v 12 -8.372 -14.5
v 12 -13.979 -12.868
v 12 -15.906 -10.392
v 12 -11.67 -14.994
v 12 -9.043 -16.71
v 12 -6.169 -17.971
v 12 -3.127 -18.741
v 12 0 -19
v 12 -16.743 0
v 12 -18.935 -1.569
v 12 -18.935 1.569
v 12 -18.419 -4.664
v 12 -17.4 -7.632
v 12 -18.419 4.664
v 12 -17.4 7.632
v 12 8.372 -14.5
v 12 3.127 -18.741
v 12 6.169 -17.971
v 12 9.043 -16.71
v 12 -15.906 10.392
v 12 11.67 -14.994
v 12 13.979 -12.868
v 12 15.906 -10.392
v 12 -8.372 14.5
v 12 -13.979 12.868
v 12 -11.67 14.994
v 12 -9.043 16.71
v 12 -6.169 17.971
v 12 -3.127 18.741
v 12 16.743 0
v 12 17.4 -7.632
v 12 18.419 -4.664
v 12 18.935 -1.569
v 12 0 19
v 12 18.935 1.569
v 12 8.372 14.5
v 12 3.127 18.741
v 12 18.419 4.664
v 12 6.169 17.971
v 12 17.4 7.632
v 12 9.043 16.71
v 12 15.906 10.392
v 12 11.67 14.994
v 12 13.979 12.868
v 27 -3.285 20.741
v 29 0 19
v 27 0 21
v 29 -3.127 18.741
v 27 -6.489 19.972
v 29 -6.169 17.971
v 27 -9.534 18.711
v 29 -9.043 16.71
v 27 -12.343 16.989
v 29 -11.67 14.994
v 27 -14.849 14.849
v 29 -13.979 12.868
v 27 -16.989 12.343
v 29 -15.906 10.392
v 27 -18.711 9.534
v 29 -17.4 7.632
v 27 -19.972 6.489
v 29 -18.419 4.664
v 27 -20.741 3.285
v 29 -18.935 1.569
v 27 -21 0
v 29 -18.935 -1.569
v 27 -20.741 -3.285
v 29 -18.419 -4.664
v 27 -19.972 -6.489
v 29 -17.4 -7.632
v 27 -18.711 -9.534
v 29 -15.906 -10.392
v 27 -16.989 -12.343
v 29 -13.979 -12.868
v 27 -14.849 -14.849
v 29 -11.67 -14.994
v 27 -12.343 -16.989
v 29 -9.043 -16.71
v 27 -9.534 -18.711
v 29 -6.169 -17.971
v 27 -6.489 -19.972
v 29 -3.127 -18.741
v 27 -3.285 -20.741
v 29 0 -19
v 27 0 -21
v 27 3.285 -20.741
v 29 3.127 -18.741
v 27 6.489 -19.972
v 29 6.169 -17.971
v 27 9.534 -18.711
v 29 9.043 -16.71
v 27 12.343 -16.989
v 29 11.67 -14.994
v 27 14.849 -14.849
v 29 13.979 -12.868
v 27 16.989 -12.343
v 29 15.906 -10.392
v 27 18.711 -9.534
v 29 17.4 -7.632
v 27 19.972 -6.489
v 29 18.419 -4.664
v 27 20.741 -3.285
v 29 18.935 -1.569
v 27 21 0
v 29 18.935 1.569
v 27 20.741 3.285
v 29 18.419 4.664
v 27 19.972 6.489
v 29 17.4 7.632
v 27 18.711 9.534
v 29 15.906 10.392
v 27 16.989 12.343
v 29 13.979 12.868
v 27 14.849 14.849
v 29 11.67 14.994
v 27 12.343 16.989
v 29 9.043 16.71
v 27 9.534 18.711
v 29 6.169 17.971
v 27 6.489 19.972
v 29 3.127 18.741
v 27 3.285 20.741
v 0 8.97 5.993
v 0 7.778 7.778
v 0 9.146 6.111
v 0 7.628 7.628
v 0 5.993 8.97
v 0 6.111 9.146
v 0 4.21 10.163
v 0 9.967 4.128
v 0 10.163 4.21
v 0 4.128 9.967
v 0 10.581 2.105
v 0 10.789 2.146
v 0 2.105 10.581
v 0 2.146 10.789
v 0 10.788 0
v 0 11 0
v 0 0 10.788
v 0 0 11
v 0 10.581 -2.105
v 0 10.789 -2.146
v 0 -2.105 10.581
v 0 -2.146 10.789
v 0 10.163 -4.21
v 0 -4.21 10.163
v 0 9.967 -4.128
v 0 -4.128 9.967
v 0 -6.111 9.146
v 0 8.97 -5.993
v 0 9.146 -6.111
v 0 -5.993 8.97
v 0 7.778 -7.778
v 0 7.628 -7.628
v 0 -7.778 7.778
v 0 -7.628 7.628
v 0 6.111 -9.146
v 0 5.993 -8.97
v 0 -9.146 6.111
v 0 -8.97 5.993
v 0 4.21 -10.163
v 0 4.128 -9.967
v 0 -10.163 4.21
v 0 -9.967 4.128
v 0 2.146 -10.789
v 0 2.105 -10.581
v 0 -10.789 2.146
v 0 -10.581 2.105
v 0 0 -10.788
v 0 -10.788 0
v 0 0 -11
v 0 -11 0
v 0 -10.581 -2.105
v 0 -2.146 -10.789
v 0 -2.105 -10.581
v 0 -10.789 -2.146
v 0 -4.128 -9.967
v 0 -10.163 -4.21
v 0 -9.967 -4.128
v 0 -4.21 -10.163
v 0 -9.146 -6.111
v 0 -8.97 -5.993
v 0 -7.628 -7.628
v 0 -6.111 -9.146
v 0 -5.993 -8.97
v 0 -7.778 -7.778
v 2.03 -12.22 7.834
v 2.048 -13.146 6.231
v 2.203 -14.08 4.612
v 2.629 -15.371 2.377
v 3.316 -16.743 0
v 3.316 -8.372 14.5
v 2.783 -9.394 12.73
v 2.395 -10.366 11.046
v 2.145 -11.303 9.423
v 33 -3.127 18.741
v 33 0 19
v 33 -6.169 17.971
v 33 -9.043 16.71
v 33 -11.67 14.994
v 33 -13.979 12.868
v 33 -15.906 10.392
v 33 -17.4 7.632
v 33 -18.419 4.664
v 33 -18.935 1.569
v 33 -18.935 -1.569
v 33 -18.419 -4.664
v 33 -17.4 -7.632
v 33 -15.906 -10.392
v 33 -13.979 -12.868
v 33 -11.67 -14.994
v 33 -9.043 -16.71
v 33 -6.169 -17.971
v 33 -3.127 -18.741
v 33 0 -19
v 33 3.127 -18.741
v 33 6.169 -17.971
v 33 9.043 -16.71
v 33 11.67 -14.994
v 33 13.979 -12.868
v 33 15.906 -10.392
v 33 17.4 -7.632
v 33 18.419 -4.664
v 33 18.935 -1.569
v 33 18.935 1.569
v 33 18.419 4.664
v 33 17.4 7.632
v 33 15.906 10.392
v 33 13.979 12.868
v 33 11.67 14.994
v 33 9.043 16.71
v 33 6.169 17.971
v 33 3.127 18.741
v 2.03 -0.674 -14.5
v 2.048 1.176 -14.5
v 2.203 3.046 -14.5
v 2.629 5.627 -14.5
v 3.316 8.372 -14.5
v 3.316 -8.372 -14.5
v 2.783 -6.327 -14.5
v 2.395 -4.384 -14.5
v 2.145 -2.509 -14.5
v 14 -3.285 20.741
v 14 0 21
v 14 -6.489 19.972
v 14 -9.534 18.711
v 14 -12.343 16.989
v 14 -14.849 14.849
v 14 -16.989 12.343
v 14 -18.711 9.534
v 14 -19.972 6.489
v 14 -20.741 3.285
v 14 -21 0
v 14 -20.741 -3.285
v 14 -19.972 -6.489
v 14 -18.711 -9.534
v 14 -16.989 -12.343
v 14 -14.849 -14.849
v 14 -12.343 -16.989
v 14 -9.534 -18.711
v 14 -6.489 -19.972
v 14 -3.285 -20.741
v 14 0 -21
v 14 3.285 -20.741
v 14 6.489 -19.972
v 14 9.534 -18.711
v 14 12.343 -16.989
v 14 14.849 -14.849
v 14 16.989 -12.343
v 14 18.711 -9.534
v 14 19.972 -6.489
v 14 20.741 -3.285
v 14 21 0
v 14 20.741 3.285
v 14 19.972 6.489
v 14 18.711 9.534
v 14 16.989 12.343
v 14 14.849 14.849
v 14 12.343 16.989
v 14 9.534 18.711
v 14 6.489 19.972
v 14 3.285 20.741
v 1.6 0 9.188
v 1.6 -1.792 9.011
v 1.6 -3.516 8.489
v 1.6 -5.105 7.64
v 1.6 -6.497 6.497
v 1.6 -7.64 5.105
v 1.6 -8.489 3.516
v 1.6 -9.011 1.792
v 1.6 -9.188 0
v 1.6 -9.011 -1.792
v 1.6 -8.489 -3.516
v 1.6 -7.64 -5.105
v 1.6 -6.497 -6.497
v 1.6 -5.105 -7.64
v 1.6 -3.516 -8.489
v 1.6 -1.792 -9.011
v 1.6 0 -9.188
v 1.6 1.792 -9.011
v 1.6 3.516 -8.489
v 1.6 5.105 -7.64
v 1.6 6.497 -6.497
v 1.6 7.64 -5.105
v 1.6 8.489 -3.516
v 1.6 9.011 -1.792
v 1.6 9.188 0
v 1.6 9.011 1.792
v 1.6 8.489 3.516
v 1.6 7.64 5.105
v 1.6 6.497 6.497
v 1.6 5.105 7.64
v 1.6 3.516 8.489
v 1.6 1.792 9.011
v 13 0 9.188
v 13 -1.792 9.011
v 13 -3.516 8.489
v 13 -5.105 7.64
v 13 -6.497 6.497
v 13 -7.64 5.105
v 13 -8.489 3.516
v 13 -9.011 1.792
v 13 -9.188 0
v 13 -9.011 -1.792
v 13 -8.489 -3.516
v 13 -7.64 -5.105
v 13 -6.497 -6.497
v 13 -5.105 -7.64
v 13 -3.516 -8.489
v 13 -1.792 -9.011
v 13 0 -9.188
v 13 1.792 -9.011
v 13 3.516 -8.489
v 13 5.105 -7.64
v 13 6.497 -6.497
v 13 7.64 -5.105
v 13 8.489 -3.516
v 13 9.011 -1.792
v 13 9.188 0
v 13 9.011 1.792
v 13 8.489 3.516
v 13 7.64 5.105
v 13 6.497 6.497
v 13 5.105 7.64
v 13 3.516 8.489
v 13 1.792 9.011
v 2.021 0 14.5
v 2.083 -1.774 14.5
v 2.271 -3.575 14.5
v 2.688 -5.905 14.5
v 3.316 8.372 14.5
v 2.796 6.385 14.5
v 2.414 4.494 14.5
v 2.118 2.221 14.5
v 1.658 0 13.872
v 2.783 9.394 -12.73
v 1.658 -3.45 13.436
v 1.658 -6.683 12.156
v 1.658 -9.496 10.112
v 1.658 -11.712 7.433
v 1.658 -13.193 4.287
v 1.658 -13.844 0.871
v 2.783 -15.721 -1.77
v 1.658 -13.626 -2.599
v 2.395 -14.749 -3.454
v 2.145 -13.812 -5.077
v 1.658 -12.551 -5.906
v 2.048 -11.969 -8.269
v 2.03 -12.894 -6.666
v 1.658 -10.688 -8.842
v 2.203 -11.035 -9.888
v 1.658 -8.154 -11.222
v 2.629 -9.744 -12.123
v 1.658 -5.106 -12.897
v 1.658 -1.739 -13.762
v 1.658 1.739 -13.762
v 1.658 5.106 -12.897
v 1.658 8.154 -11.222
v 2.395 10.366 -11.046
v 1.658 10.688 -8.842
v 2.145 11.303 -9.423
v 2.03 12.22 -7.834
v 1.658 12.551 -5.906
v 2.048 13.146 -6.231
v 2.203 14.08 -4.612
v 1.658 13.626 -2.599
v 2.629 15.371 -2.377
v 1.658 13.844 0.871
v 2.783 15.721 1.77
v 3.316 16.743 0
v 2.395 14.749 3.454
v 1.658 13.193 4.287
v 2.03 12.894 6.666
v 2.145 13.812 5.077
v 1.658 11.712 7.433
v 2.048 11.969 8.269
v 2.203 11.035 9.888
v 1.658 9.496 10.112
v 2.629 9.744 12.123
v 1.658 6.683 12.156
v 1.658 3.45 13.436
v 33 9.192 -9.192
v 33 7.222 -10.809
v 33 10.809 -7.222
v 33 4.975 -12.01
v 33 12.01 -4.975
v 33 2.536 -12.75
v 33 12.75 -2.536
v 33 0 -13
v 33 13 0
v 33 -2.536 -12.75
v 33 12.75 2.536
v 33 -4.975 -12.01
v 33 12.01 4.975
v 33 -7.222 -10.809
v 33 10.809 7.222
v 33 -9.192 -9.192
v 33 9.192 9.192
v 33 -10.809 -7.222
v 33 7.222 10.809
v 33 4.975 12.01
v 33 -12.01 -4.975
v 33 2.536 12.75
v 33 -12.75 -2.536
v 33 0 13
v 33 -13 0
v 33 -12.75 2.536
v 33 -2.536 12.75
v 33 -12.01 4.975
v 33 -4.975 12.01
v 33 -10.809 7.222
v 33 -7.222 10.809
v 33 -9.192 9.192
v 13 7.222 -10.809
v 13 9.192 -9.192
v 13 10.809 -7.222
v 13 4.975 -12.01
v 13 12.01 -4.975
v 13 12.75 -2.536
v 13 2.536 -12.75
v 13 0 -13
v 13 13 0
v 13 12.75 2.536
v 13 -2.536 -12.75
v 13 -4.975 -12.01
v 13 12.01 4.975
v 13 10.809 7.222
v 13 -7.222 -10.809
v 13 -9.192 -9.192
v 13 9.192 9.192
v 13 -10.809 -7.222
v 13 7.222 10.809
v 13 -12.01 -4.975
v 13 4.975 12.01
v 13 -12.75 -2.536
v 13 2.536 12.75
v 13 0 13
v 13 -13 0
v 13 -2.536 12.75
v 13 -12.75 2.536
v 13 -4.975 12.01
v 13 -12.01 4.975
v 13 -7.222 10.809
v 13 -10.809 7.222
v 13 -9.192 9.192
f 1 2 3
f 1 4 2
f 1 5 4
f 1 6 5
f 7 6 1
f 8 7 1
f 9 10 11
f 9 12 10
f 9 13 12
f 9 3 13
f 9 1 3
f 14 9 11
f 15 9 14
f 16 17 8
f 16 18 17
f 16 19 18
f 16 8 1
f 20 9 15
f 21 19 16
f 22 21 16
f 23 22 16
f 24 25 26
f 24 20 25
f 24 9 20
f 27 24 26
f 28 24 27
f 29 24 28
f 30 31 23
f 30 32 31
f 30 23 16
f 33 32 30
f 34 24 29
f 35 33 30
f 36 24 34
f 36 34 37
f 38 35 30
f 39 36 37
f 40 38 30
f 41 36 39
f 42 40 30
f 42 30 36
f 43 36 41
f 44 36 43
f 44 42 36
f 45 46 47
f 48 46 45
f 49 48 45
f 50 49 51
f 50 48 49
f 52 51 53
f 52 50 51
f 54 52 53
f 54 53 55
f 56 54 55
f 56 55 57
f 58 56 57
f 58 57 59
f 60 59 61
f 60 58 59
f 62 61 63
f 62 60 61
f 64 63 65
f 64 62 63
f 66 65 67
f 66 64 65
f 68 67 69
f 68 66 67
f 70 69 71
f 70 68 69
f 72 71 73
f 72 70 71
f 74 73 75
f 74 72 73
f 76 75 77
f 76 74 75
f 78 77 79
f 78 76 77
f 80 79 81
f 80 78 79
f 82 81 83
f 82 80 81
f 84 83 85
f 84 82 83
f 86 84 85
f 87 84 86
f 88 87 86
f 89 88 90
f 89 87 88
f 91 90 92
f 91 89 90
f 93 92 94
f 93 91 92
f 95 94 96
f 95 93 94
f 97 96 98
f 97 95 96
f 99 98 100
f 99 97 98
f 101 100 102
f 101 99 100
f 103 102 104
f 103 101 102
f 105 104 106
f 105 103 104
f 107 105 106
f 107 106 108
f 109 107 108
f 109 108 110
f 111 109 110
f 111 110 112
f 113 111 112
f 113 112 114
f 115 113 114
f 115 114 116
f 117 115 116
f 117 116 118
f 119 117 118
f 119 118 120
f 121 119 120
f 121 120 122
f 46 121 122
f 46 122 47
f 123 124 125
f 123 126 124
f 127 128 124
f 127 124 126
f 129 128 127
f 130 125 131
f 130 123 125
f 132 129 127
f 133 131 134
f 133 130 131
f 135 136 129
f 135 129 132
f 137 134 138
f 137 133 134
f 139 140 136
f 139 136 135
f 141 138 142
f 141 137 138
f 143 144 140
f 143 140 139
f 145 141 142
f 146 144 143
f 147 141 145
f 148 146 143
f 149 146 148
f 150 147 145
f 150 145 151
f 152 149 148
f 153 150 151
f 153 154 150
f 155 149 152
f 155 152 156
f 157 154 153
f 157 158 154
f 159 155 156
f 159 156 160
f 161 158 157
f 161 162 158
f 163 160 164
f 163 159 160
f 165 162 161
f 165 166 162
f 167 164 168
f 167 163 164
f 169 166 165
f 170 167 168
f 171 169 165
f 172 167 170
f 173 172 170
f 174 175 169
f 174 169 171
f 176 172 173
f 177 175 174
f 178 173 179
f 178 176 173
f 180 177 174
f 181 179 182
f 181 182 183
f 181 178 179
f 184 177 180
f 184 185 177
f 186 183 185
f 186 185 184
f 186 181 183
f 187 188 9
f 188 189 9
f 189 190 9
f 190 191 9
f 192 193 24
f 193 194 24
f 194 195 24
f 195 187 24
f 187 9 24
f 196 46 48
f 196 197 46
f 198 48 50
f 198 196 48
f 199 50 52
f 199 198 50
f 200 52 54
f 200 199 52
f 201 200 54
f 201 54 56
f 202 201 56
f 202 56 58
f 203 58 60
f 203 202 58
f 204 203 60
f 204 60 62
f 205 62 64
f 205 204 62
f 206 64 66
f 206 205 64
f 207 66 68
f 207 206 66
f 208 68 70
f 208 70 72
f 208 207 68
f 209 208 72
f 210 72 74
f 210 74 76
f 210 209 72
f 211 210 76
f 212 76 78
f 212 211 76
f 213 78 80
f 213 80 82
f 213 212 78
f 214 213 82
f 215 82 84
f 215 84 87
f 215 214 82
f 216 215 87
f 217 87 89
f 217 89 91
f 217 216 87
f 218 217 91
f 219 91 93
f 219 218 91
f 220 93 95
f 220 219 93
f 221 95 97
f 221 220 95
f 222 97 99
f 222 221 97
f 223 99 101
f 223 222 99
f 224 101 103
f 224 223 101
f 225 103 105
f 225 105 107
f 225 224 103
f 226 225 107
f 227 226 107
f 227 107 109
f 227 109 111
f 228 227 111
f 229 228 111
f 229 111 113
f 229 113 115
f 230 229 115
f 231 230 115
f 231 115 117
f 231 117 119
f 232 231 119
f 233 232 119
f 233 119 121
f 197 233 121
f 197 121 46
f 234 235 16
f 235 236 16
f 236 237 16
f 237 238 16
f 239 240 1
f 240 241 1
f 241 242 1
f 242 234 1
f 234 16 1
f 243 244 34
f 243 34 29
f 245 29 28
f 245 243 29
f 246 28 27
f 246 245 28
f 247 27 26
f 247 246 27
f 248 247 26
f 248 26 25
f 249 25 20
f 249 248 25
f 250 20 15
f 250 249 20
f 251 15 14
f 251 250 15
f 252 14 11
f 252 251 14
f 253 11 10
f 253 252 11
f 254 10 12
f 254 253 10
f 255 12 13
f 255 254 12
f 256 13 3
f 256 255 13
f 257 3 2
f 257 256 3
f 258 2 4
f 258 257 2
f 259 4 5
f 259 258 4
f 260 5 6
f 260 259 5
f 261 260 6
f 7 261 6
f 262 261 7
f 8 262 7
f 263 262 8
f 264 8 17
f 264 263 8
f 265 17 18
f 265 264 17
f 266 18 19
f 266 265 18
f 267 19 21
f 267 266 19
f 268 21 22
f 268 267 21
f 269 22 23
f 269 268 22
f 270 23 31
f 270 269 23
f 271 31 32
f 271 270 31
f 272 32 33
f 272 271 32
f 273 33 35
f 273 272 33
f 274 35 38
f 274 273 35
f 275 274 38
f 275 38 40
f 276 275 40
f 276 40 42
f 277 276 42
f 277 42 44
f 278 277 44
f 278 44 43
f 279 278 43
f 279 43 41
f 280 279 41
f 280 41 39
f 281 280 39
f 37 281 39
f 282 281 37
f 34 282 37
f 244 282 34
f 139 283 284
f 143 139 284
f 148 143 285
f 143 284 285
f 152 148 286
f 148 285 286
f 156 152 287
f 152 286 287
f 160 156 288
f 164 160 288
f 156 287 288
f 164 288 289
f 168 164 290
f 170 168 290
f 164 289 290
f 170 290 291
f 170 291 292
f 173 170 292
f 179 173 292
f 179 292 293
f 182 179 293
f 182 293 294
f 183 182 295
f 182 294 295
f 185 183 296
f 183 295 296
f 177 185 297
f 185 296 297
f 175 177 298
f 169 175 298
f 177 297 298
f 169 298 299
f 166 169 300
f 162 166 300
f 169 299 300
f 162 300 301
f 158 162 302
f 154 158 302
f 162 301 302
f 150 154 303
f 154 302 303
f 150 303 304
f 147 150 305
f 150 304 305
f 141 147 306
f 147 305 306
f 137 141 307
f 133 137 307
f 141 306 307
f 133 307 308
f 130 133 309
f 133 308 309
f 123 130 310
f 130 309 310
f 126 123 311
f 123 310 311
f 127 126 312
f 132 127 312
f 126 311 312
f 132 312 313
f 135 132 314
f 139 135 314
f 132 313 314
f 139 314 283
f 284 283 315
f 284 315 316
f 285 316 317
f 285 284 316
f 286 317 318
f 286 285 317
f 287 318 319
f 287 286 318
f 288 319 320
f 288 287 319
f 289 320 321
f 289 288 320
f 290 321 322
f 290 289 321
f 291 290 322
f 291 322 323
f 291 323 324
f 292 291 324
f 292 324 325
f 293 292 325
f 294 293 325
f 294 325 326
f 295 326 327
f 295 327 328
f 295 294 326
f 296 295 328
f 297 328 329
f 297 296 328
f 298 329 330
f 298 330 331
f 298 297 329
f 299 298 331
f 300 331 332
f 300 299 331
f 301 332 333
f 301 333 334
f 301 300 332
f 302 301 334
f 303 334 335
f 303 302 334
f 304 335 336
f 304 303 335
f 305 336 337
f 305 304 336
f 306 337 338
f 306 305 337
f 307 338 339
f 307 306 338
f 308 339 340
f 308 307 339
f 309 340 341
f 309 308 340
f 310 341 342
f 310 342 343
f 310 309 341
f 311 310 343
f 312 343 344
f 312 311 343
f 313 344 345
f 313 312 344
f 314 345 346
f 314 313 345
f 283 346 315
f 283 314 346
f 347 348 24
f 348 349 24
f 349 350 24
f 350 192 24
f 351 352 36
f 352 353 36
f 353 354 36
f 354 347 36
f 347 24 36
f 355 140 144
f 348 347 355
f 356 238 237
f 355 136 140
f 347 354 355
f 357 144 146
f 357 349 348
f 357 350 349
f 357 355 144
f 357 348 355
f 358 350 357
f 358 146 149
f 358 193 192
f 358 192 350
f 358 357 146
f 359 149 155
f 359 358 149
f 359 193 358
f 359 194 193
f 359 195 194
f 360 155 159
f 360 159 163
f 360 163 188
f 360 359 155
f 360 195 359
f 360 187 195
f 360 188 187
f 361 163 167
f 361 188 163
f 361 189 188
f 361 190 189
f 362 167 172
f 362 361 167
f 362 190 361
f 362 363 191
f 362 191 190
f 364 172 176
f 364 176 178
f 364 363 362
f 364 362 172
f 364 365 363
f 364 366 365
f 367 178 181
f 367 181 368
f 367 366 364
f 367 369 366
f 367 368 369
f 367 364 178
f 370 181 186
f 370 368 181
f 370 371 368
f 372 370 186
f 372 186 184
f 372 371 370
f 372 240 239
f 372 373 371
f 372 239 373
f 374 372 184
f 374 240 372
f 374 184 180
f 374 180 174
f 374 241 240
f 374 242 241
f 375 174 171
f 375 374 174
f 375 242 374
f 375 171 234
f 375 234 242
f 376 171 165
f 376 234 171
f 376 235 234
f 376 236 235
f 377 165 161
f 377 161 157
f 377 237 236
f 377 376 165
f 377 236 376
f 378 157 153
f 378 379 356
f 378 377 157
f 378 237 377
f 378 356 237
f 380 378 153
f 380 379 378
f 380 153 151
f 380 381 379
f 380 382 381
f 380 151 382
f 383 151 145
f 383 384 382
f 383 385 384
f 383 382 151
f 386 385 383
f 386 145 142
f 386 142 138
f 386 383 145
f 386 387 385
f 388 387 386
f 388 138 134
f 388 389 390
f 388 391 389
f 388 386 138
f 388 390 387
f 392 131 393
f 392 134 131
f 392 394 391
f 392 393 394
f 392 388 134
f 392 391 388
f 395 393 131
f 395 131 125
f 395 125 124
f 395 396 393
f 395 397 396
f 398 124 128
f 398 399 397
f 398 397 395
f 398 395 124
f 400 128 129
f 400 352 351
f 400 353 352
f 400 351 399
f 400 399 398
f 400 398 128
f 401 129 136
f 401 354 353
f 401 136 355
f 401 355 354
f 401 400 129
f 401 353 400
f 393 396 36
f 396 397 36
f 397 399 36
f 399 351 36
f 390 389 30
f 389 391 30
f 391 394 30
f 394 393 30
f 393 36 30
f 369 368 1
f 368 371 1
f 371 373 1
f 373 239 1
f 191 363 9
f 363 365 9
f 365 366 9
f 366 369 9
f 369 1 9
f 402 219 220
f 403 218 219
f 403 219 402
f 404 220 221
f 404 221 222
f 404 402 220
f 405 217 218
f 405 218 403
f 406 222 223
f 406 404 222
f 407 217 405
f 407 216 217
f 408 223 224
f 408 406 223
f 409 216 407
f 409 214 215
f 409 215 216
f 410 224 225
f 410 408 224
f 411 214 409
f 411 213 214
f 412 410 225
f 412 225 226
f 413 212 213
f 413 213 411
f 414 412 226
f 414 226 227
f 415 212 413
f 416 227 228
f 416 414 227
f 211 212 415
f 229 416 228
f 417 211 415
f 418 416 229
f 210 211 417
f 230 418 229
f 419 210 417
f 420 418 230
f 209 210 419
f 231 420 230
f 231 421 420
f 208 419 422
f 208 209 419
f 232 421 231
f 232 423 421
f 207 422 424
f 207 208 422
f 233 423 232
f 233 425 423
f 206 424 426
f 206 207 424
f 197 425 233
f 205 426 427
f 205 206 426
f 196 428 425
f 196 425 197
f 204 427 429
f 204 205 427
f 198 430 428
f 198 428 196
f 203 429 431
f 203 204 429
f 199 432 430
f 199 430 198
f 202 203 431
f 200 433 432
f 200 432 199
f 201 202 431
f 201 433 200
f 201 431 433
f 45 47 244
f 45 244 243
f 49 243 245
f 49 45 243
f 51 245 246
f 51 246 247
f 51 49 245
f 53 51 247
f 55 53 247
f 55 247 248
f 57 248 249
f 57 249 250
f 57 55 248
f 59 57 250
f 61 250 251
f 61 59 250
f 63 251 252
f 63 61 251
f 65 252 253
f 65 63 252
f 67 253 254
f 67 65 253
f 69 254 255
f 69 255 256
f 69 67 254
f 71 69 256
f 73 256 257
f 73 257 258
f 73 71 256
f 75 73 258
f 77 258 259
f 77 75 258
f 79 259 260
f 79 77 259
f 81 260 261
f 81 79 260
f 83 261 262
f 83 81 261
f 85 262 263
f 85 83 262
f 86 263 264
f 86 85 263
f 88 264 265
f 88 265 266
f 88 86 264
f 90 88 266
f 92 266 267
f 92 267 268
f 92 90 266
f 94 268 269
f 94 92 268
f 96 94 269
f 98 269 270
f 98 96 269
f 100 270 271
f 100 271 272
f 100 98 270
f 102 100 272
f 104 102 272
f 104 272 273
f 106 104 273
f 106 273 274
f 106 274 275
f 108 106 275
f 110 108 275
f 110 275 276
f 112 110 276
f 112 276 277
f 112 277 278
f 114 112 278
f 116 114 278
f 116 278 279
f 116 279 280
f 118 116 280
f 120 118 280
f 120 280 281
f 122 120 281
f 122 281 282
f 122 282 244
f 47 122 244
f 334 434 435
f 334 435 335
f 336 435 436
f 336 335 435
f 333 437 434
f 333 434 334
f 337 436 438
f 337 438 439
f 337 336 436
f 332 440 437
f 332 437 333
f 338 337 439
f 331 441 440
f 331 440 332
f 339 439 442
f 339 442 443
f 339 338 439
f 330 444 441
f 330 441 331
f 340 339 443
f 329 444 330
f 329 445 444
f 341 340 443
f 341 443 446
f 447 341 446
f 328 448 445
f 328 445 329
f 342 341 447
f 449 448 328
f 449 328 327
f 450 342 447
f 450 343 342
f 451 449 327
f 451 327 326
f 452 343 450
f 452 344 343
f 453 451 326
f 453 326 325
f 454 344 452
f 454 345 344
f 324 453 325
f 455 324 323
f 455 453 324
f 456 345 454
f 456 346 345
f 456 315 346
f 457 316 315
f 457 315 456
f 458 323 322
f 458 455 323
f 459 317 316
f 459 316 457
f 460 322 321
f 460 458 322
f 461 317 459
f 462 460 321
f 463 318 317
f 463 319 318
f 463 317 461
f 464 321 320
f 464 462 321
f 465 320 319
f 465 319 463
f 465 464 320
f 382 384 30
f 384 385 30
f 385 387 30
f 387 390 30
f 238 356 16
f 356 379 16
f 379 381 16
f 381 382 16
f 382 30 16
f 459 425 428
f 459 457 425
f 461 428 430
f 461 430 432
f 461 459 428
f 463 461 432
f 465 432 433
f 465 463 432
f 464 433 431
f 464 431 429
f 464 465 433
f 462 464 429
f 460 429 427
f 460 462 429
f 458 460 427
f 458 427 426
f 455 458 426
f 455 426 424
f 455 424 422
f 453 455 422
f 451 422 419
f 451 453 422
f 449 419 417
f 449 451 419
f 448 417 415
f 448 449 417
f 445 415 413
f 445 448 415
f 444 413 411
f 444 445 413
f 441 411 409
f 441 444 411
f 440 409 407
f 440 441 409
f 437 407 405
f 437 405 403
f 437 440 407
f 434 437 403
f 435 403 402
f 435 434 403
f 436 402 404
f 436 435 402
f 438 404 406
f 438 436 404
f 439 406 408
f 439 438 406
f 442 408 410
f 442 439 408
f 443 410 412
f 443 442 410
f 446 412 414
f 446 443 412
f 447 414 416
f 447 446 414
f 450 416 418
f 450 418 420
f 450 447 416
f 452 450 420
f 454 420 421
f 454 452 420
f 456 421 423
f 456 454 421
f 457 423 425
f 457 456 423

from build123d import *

# Parameters (mm, degrees)
CUT_EXTRUDE_START   = -12
SKETCH_2_R          = 17.5
CUT_EXTRUDE_1_DEPTH = 12
CHAMFER_1_SIZE      = 2
CHAMFER_2_SIZE      = 1.6


with BuildPart() as part:
    # Эскиз1 → Повернуть1 (revolve)
    with BuildSketch(Plane.XY, mode=Mode.PRIVATE) as revolve_1_sk:
        Polygon((0, -9.188), (0, -11), (3.75277675, -17.5), (12, -17.5), (12, -21), (27, -21), (29, -19), (33, -19), (33, -13), (13, -13), (13, -9.188), align=None)
    revolve(revolve_1_sk.sketch.rotate(Axis((0, 0, 0), (1, 0, 0)), 270), axis=Axis((0, 0, 0), (1, 0, 0)))

    # Эскиз2 → Вырез-Вытянуть1 (cut)
    with BuildSketch(Plane.ZY.offset(CUT_EXTRUDE_START)):
        Circle(SKETCH_2_R)
        Polygon((0, 16.743157806), (-14.5, 8.371578903), (-14.5, -8.371578903), (0, -16.743157806), (14.5, -8.371578903), (14.5, 8.371578903), align=None, mode=Mode.SUBTRACT)
    extrude(amount=CUT_EXTRUDE_1_DEPTH, mode=Mode.SUBTRACT)

    # Фаска1
    chamfer_1_edges = [part.edges().sort_by_distance(p)[0] for p in [
        (12, 0, -21),
    ]]
    chamfer(chamfer_1_edges, length=CHAMFER_1_SIZE)

    # Фаска2
    chamfer_2_edges = [part.edges().sort_by_distance(p)[0] for p in [
        (0, 0, -9.188),
    ]]
    chamfer(chamfer_2_edges, length=CHAMFER_2_SIZE)


solid = part.part
